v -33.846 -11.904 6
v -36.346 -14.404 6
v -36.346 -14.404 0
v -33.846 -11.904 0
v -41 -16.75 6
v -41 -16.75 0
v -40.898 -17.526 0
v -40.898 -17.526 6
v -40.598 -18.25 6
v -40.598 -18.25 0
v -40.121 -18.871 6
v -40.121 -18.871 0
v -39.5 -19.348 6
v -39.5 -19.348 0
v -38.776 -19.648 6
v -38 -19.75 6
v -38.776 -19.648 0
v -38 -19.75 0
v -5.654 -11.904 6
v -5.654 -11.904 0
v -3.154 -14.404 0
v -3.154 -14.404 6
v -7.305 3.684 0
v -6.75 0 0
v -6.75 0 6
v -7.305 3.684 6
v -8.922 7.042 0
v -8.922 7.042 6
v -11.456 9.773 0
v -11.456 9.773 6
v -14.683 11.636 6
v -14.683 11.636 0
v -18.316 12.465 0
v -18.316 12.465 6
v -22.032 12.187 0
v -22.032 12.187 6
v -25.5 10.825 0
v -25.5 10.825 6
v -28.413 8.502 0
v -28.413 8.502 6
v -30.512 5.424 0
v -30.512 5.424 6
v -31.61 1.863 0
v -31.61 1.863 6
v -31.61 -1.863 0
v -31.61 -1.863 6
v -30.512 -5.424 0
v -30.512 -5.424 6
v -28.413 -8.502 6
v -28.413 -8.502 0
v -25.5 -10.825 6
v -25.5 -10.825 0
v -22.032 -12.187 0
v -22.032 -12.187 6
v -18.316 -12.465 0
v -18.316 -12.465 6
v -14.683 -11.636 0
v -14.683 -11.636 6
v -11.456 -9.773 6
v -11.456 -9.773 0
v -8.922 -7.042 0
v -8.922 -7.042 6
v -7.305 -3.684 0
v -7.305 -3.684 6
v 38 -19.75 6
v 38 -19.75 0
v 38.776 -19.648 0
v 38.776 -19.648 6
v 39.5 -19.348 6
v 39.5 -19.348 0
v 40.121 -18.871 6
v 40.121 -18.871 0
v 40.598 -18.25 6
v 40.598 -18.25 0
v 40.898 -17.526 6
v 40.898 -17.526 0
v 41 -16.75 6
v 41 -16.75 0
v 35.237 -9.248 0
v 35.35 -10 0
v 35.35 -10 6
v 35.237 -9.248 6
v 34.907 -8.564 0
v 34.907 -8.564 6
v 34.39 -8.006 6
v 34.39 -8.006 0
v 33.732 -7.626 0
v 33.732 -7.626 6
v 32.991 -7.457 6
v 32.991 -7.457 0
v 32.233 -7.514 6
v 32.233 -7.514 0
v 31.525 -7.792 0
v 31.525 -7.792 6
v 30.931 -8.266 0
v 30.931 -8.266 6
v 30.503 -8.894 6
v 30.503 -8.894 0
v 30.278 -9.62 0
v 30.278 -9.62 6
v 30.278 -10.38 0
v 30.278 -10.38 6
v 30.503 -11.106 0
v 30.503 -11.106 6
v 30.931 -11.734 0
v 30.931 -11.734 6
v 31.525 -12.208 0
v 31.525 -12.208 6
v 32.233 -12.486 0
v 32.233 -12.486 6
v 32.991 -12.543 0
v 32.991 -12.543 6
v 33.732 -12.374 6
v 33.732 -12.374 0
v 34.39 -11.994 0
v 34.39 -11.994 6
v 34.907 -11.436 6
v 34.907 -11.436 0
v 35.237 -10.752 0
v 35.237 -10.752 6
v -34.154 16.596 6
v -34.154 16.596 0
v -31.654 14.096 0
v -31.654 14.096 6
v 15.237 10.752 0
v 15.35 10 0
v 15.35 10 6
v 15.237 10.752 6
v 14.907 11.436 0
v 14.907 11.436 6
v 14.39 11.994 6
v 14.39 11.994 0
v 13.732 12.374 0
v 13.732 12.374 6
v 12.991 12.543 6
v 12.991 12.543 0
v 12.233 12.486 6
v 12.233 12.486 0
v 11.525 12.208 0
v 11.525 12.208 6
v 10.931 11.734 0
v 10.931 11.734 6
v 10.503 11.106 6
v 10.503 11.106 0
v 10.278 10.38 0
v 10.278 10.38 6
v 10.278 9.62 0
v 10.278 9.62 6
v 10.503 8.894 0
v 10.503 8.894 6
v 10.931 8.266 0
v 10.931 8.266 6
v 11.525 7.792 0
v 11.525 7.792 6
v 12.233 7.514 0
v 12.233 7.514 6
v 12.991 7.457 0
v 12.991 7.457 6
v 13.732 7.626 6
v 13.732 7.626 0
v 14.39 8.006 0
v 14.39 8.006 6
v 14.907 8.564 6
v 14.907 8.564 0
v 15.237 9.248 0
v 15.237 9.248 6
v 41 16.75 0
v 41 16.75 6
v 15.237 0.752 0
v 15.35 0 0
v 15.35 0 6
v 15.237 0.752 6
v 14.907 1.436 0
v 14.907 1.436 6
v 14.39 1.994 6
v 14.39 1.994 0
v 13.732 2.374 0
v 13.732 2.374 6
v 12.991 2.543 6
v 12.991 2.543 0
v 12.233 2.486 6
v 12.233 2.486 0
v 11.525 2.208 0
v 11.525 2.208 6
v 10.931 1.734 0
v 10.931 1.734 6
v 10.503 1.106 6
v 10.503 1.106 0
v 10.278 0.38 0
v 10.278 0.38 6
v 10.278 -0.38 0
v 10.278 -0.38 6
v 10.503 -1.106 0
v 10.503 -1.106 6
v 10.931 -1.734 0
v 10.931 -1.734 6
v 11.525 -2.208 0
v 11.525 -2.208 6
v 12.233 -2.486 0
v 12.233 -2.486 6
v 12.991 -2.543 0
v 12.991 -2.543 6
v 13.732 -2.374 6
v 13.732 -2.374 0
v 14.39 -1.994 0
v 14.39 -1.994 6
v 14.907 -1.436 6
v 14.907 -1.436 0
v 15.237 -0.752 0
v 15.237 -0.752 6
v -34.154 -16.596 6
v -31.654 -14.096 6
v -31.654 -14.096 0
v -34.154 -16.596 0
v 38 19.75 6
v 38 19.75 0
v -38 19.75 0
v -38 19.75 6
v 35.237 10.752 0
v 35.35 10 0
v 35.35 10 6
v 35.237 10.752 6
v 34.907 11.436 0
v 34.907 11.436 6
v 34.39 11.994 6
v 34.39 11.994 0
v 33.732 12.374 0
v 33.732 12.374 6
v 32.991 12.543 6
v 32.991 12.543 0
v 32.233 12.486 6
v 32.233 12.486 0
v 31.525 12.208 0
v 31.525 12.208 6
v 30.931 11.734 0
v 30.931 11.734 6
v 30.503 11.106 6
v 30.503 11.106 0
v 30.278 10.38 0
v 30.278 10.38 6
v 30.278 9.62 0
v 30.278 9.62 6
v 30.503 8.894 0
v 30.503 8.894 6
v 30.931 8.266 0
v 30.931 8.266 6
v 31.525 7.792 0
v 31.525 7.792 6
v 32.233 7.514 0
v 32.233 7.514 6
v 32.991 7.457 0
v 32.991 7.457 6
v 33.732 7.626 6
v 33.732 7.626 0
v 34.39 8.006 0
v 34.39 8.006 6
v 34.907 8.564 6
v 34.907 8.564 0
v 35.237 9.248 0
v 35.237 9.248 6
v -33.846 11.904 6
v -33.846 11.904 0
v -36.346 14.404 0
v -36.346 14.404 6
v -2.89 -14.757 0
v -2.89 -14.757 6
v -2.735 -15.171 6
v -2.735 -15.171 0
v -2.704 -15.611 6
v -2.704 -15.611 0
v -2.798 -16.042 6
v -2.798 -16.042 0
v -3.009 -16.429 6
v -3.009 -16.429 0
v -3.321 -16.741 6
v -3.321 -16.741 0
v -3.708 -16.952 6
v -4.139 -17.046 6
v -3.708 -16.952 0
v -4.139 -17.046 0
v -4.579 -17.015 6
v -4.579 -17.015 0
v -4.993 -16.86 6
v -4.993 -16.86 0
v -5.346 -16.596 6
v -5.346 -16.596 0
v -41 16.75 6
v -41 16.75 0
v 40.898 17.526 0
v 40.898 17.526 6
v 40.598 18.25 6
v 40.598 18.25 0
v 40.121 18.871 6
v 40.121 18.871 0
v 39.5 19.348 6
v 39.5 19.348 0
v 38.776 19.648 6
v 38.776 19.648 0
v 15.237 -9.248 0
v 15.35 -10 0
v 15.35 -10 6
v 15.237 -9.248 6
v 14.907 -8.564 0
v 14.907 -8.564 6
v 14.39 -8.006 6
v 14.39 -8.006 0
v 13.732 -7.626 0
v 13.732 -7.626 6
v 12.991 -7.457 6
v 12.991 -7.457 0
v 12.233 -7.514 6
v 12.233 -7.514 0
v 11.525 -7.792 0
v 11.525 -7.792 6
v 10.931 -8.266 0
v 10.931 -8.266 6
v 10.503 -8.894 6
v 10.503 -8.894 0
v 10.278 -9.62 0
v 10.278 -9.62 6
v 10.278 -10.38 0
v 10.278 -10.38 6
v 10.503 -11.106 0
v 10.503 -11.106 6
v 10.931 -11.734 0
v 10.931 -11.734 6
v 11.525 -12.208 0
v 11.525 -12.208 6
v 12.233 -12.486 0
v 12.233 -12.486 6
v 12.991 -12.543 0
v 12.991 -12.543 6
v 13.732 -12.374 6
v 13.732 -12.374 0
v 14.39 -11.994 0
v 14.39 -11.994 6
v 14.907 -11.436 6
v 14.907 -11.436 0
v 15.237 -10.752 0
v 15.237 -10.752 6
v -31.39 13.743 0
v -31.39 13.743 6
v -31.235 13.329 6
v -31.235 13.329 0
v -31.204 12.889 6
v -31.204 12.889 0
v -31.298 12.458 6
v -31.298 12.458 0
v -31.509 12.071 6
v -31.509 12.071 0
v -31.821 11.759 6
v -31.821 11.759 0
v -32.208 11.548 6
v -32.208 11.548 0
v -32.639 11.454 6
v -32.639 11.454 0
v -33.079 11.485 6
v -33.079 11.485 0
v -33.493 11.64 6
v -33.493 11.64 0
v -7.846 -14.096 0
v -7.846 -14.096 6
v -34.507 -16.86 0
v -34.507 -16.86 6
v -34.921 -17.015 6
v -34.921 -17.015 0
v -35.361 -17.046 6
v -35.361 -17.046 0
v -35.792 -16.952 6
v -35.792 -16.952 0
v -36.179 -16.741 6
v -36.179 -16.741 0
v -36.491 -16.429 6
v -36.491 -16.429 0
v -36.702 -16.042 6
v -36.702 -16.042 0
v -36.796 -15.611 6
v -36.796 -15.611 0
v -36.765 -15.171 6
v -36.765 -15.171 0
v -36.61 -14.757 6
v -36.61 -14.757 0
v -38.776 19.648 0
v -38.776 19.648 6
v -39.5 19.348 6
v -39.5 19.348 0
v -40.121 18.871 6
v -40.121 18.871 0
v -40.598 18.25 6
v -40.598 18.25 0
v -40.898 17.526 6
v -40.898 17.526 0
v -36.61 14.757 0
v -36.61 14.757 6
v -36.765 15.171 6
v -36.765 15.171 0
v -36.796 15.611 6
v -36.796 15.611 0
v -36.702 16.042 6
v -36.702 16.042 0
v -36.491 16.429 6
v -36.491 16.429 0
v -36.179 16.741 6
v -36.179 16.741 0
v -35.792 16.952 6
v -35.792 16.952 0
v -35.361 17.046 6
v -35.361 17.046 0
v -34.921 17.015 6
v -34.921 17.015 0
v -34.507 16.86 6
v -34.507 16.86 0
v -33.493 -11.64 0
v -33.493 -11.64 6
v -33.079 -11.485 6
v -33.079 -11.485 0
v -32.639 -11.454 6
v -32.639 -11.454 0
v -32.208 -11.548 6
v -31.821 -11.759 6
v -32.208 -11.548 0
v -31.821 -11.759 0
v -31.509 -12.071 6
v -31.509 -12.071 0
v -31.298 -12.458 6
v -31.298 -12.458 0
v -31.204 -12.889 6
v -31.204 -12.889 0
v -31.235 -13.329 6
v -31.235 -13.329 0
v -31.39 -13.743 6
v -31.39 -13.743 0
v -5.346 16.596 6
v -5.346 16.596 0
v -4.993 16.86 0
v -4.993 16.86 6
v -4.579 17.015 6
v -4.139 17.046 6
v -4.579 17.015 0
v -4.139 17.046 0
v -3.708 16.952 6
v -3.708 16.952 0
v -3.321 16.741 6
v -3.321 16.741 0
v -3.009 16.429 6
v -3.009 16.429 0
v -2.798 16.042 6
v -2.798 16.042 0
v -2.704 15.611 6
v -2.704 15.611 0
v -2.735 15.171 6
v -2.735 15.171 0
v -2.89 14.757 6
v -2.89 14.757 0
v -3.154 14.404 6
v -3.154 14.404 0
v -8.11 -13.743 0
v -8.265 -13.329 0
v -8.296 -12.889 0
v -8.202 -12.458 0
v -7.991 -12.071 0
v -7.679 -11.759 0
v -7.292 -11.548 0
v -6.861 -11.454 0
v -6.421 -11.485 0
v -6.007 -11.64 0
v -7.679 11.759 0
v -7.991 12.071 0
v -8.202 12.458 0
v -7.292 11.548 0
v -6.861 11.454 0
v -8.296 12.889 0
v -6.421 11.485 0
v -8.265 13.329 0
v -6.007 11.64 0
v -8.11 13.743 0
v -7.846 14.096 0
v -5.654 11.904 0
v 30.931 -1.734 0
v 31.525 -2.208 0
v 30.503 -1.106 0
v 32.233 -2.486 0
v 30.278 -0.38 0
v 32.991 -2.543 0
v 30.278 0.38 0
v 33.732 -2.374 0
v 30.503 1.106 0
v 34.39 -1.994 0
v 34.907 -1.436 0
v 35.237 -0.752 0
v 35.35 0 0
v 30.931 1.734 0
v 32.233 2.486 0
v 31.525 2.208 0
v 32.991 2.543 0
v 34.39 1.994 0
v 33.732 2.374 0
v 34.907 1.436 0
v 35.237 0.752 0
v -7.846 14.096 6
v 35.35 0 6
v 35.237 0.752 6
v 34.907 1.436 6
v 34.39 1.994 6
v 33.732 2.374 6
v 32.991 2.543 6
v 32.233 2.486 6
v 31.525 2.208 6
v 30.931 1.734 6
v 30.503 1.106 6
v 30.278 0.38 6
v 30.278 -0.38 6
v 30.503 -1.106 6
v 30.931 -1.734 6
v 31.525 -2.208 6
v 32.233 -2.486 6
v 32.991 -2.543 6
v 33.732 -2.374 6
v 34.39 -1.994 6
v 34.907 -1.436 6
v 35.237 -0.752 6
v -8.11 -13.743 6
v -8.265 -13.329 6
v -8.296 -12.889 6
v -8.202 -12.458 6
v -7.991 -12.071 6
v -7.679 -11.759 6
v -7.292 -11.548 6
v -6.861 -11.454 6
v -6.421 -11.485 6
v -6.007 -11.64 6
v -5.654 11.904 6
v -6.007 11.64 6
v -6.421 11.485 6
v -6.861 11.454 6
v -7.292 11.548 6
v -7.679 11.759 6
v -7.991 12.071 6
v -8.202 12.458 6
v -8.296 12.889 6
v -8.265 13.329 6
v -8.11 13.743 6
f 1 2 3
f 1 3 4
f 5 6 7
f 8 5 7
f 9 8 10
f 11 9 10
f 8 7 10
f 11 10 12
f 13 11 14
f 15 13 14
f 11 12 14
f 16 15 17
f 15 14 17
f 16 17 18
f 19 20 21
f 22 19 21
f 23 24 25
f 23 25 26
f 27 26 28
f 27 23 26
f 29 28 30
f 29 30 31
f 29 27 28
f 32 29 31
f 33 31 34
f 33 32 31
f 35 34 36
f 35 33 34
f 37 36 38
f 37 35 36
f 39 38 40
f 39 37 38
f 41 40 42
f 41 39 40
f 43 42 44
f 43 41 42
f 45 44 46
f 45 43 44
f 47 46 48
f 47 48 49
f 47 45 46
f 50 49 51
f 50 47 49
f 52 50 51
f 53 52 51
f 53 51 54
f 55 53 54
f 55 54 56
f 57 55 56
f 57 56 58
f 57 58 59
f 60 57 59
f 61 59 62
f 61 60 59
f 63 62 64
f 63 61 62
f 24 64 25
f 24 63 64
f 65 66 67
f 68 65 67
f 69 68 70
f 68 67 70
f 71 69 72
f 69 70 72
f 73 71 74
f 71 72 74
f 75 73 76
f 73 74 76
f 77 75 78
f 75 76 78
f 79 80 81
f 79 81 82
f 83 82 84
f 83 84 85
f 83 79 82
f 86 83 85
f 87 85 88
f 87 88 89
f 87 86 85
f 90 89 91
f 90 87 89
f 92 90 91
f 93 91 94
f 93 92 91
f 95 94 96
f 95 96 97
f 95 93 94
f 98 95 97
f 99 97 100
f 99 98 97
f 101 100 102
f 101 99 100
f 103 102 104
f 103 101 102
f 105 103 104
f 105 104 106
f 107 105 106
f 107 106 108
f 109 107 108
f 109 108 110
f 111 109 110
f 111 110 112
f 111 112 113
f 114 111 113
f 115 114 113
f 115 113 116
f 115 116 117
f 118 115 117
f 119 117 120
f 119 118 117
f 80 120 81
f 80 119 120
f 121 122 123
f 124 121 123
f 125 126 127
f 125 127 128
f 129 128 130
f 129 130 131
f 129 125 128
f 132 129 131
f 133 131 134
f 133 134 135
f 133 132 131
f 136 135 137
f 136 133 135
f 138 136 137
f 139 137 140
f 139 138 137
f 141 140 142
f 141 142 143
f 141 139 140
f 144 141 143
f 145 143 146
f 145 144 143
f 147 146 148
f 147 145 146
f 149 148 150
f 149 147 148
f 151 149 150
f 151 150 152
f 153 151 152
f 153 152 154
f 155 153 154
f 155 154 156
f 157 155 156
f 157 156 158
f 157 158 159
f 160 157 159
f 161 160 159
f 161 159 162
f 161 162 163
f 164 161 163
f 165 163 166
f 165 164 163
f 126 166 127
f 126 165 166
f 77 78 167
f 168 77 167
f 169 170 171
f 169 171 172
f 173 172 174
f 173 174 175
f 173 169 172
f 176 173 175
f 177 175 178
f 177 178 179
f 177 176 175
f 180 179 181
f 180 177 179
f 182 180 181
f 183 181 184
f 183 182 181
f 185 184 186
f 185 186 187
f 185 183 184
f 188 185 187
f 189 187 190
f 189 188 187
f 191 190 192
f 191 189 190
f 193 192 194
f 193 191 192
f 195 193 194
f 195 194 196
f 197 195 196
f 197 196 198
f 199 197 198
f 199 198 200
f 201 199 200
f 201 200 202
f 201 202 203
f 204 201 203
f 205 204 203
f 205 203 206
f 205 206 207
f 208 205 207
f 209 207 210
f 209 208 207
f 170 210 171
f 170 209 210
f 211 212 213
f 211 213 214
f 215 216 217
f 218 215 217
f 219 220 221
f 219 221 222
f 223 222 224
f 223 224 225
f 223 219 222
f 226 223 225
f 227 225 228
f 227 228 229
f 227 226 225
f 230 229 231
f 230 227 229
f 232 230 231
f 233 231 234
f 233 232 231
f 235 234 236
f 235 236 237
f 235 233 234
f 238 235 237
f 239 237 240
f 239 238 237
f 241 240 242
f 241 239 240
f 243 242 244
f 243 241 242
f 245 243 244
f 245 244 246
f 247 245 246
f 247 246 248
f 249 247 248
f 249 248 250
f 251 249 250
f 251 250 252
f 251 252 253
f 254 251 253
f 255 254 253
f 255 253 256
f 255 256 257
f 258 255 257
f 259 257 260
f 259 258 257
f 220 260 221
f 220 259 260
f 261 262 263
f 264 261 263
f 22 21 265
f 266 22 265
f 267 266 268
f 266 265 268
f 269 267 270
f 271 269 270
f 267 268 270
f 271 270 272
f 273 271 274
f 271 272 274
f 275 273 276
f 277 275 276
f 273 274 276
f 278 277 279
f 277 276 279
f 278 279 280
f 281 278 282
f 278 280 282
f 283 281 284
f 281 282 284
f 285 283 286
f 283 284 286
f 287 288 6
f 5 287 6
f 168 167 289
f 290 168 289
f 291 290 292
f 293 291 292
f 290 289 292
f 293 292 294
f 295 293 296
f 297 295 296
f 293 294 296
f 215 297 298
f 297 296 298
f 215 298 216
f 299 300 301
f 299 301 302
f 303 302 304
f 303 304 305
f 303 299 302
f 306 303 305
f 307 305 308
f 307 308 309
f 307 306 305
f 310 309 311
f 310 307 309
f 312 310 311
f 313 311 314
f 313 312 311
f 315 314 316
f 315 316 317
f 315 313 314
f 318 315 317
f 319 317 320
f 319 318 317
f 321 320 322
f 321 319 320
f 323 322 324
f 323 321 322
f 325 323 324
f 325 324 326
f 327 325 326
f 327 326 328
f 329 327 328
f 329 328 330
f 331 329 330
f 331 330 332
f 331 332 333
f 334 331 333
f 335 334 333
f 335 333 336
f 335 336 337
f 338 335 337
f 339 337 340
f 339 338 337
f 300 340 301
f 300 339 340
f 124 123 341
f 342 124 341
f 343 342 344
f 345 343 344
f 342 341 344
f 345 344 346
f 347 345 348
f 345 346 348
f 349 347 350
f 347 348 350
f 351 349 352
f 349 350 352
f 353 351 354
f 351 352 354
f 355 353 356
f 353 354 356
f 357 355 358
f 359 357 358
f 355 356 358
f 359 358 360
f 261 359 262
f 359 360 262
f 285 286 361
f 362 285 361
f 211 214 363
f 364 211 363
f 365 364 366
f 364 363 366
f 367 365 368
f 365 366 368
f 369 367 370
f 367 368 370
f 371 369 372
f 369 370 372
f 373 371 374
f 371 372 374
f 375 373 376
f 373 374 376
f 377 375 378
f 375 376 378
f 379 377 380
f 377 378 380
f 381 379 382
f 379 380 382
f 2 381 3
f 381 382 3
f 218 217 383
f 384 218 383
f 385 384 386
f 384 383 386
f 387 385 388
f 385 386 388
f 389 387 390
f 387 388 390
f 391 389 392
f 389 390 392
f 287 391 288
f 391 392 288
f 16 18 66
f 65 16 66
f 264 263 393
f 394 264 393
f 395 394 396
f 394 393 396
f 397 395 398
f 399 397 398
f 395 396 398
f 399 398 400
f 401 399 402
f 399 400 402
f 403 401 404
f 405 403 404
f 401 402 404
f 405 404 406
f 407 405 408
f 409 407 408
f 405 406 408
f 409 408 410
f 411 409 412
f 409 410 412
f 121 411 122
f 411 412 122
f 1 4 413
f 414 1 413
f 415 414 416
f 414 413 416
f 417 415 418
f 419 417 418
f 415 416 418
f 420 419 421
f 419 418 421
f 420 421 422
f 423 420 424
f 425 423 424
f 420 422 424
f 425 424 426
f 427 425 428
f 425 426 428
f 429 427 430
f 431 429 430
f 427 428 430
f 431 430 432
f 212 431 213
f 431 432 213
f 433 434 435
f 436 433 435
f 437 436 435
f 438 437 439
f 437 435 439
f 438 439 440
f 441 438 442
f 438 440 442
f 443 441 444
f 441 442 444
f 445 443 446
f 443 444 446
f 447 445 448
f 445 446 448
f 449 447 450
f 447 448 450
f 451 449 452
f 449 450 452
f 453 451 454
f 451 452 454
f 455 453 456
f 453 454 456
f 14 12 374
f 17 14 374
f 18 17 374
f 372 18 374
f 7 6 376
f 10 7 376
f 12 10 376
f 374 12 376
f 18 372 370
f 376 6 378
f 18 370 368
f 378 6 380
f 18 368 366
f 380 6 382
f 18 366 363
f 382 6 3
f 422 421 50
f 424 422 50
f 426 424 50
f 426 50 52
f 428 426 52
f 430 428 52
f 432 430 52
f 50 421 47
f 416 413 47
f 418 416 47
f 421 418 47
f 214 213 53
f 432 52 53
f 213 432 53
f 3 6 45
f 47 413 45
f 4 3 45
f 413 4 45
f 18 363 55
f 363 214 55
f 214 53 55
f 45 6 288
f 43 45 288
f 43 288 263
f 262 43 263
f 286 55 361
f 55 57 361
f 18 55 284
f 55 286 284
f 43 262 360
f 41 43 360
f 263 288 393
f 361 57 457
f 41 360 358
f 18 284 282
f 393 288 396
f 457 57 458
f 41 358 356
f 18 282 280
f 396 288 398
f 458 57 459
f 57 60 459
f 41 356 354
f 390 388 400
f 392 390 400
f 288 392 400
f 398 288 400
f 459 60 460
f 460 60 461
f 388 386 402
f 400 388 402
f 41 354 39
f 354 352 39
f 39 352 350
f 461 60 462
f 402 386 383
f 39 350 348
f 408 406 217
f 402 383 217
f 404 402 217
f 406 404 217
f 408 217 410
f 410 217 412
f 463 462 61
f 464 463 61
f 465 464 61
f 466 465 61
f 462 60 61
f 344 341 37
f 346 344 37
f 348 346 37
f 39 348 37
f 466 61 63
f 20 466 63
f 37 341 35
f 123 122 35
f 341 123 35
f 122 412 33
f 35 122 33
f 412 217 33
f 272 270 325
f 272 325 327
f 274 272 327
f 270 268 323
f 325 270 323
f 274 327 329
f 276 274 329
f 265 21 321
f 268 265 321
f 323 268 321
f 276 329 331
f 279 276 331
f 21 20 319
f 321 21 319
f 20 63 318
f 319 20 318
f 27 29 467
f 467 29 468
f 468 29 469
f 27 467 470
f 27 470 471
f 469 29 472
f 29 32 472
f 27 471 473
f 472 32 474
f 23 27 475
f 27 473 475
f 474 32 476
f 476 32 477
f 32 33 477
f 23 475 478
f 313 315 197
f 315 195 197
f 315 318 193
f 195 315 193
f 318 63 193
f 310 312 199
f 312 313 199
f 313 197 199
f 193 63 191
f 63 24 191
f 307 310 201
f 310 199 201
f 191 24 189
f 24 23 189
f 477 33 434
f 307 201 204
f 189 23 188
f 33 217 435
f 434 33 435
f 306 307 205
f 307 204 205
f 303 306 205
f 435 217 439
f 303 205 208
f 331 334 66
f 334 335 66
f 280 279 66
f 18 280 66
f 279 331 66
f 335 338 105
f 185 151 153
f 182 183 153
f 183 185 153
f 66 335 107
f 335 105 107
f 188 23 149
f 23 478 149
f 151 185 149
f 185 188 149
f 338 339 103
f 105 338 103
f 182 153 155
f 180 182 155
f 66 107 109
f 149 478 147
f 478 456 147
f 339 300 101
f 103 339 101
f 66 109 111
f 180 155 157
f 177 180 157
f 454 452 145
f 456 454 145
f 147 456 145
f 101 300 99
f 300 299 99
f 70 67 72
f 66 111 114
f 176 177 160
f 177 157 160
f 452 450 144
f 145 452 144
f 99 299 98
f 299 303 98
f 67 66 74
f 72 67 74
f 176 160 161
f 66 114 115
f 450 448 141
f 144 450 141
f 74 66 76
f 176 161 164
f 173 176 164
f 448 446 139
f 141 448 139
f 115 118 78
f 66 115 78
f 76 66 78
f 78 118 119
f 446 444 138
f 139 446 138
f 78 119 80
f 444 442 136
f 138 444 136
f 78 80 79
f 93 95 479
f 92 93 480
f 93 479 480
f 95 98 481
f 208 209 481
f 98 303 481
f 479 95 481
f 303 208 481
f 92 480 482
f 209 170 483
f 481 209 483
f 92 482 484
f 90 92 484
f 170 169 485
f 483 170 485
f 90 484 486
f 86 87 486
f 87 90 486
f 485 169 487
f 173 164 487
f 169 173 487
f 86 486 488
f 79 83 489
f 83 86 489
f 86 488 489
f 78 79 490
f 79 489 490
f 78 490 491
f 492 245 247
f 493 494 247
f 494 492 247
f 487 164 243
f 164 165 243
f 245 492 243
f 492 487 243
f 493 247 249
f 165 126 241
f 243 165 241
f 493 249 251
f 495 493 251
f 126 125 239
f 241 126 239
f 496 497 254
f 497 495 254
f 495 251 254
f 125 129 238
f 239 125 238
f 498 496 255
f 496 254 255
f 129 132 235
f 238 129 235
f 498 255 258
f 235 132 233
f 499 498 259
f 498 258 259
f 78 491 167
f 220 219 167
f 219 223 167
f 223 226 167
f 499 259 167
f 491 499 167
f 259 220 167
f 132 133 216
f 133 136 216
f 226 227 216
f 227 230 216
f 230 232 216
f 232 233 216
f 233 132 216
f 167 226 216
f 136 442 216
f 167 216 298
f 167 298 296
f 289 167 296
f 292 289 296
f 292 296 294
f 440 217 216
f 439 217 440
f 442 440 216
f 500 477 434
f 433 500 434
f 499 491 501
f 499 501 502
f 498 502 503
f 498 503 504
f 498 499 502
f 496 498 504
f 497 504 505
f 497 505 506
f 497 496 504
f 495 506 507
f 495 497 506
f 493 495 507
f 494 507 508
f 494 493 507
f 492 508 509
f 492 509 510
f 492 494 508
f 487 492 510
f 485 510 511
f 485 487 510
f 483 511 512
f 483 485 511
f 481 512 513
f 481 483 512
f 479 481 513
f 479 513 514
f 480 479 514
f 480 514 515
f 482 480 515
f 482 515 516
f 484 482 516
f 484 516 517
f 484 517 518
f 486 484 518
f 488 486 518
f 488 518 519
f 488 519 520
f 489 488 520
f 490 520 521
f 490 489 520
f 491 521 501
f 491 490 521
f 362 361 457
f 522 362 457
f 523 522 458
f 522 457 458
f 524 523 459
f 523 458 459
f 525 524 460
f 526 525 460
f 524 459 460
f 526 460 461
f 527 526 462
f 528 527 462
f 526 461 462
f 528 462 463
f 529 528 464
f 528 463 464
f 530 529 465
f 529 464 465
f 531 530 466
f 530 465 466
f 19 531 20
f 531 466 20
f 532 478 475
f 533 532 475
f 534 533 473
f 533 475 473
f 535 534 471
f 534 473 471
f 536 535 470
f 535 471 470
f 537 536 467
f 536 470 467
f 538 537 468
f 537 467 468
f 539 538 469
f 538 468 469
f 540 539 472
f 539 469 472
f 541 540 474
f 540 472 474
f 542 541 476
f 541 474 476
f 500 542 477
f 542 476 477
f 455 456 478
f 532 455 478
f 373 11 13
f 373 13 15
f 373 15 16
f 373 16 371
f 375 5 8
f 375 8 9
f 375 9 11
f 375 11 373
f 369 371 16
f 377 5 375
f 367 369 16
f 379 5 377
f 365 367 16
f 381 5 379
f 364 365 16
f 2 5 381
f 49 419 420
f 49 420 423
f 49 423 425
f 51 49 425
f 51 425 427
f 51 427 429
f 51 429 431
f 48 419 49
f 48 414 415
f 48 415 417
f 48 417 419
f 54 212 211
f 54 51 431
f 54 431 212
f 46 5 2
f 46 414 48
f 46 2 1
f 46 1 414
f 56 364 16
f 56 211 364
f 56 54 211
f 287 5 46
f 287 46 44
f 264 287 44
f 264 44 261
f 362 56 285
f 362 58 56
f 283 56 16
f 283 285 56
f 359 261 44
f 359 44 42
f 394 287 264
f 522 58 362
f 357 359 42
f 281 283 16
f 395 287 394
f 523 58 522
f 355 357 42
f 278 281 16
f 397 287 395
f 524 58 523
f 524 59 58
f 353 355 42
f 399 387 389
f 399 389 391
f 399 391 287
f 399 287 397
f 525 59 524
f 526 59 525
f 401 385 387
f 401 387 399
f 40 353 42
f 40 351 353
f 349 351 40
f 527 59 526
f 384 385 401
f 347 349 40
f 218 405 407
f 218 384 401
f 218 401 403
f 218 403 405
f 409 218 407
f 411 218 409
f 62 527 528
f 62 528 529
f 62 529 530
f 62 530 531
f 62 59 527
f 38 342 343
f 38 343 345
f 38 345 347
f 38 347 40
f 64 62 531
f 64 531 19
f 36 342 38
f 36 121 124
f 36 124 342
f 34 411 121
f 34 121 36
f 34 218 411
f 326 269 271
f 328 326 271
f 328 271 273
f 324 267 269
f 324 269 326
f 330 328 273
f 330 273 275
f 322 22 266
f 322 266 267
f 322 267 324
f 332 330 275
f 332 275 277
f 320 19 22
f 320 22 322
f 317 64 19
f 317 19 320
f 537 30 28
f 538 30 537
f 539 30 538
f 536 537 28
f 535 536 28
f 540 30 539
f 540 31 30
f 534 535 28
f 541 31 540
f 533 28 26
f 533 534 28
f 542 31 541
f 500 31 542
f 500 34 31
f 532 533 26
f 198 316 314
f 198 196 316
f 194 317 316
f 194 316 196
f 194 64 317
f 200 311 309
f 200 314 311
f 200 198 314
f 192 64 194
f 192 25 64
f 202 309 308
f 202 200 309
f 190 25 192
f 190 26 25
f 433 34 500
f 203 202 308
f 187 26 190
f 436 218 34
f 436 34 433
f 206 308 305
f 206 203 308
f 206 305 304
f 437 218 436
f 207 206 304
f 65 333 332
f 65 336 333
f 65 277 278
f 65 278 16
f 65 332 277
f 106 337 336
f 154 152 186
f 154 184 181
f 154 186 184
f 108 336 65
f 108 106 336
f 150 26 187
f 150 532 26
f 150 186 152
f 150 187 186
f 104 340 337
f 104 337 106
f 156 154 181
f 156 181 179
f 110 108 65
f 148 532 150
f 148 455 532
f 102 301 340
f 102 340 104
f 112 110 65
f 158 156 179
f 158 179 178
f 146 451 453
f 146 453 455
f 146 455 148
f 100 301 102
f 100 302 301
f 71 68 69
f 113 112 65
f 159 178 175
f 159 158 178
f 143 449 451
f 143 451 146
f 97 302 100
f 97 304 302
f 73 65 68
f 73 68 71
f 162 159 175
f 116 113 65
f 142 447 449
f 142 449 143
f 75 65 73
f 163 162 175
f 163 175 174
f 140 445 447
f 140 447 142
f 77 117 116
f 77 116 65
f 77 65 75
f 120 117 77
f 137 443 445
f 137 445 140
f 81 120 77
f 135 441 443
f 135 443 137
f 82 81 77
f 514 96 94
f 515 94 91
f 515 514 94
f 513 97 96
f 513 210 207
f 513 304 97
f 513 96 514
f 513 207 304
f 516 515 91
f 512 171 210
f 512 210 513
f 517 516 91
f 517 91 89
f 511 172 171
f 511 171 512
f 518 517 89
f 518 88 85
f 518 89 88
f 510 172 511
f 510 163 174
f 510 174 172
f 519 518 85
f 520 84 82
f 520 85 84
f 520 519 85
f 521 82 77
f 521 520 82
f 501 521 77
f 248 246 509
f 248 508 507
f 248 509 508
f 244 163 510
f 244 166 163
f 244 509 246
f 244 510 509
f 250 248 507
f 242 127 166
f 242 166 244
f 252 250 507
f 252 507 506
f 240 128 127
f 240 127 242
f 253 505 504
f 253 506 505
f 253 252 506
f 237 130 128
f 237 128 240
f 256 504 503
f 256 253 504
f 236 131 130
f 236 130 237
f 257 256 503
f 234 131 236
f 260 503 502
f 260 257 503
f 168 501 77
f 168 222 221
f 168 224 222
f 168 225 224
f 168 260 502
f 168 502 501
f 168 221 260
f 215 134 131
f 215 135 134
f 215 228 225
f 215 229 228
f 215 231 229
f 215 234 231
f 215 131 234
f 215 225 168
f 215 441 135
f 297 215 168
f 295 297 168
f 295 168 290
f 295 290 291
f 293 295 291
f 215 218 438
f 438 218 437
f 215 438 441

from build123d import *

# Parameters (mm, degrees)
F0_R     = 12.5
F0_R_2   = 2.55
F1_DEPTH = 6


# Not quite as in the source:
# - ends of sketch curves that miss each other by under 0.0002 mm in the source are joined


with BuildPart() as f1:
    # F0 (on Top) → F1 (new body)
    with BuildSketch(Plane.XY):
        with BuildLine():
            Line((38, 19.75), (-38, 19.75))
            ThreePointArc((-38, 19.75), (-40.1213203436, 18.8713203436), (-41, 16.75))
            Line((-41, 16.75), (-41, -16.75))
            ThreePointArc((-41, -16.75), (-40.1213203436, -18.8713203436), (-38, -19.75))
            Line((-38, -19.75), (38, -19.75))
            ThreePointArc((38, -19.75), (40.1213203436, -18.8713203436), (41, -16.75))
            Line((41, -16.75), (41, 16.75))
            ThreePointArc((41, 16.75), (40.1213203436, 18.8713203436), (38, 19.75))
        make_face()
        with BuildLine():
            ThreePointArc((-34.1539839892, -16.5960150108), (-36.3460155108, -16.5960155108), (-36.3460150108, -14.4039839892))
            Line((-36.346015, -14.403984), (-33.846015, -11.903984))
            ThreePointArc((-33.8460150108, -11.9039839892), (-31.6539844892, -11.9039844892), (-31.6539839892, -14.0960150108))
            Line((-31.653984, -14.096015), (-34.153984, -16.596015))
        make_face(mode=Mode.SUBTRACT)
        with BuildLine():
            ThreePointArc((-3.1539844892, -14.4039844892), (-3.1539844892, -16.5960155108), (-5.3460155108, -16.5960155108))
            Line((-5.3460155108, -16.5960155108), (-7.846015, -14.096015))
            ThreePointArc((-7.846015, -14.096015), (-7.8460155108, -11.9039844892), (-5.6539844892, -11.9039844892))
            Line((-5.6539844892, -11.9039844892), (-3.1539844892, -14.4039844892))
        make_face(mode=Mode.SUBTRACT)
        with Locations((-19.25, 0)):
            Circle(F0_R, mode=Mode.SUBTRACT)
        with Locations((12.8, -10)):
            Circle(F0_R_2, mode=Mode.SUBTRACT)
        with Locations((32.8, -10)):
            Circle(F0_R_2, mode=Mode.SUBTRACT)
        with Locations((12.8, 0)):
            Circle(F0_R_2, mode=Mode.SUBTRACT)
        with Locations((32.8, 0)):
            Circle(F0_R_2, mode=Mode.SUBTRACT)
        with BuildLine():
            ThreePointArc((-31.6539844892, 14.0960155108), (-31.6539844892, 11.9039844892), (-33.8460155108, 11.9039844892))
            Line((-33.8460155108, 11.9039844892), (-36.346015, 14.403985))
            ThreePointArc((-36.346015, 14.403985), (-36.3460155108, 16.5960155108), (-34.1539844892, 16.5960155108))
            Line((-34.1539844892, 16.5960155108), (-31.6539844892, 14.0960155108))
        make_face(mode=Mode.SUBTRACT)
        with BuildLine():
            ThreePointArc((-5.3460150108, 16.5960160108), (-3.1539844892, 16.5960155108), (-3.1539839892, 14.4039849892))
            Line((-3.153984, 14.403985), (-5.653984, 11.903985))
            ThreePointArc((-5.6539839892, 11.9039849892), (-7.8460155108, 11.9039844892), (-7.8460150108, 14.0960160108))
            Line((-7.846015, 14.096016), (-5.346015, 16.596016))
        make_face(mode=Mode.SUBTRACT)
        with Locations((12.8, 10)):
            Circle(F0_R_2, mode=Mode.SUBTRACT)
        with Locations((32.8, 10)):
            Circle(F0_R_2, mode=Mode.SUBTRACT)
    extrude(amount=F1_DEPTH)


solid = f1.part
